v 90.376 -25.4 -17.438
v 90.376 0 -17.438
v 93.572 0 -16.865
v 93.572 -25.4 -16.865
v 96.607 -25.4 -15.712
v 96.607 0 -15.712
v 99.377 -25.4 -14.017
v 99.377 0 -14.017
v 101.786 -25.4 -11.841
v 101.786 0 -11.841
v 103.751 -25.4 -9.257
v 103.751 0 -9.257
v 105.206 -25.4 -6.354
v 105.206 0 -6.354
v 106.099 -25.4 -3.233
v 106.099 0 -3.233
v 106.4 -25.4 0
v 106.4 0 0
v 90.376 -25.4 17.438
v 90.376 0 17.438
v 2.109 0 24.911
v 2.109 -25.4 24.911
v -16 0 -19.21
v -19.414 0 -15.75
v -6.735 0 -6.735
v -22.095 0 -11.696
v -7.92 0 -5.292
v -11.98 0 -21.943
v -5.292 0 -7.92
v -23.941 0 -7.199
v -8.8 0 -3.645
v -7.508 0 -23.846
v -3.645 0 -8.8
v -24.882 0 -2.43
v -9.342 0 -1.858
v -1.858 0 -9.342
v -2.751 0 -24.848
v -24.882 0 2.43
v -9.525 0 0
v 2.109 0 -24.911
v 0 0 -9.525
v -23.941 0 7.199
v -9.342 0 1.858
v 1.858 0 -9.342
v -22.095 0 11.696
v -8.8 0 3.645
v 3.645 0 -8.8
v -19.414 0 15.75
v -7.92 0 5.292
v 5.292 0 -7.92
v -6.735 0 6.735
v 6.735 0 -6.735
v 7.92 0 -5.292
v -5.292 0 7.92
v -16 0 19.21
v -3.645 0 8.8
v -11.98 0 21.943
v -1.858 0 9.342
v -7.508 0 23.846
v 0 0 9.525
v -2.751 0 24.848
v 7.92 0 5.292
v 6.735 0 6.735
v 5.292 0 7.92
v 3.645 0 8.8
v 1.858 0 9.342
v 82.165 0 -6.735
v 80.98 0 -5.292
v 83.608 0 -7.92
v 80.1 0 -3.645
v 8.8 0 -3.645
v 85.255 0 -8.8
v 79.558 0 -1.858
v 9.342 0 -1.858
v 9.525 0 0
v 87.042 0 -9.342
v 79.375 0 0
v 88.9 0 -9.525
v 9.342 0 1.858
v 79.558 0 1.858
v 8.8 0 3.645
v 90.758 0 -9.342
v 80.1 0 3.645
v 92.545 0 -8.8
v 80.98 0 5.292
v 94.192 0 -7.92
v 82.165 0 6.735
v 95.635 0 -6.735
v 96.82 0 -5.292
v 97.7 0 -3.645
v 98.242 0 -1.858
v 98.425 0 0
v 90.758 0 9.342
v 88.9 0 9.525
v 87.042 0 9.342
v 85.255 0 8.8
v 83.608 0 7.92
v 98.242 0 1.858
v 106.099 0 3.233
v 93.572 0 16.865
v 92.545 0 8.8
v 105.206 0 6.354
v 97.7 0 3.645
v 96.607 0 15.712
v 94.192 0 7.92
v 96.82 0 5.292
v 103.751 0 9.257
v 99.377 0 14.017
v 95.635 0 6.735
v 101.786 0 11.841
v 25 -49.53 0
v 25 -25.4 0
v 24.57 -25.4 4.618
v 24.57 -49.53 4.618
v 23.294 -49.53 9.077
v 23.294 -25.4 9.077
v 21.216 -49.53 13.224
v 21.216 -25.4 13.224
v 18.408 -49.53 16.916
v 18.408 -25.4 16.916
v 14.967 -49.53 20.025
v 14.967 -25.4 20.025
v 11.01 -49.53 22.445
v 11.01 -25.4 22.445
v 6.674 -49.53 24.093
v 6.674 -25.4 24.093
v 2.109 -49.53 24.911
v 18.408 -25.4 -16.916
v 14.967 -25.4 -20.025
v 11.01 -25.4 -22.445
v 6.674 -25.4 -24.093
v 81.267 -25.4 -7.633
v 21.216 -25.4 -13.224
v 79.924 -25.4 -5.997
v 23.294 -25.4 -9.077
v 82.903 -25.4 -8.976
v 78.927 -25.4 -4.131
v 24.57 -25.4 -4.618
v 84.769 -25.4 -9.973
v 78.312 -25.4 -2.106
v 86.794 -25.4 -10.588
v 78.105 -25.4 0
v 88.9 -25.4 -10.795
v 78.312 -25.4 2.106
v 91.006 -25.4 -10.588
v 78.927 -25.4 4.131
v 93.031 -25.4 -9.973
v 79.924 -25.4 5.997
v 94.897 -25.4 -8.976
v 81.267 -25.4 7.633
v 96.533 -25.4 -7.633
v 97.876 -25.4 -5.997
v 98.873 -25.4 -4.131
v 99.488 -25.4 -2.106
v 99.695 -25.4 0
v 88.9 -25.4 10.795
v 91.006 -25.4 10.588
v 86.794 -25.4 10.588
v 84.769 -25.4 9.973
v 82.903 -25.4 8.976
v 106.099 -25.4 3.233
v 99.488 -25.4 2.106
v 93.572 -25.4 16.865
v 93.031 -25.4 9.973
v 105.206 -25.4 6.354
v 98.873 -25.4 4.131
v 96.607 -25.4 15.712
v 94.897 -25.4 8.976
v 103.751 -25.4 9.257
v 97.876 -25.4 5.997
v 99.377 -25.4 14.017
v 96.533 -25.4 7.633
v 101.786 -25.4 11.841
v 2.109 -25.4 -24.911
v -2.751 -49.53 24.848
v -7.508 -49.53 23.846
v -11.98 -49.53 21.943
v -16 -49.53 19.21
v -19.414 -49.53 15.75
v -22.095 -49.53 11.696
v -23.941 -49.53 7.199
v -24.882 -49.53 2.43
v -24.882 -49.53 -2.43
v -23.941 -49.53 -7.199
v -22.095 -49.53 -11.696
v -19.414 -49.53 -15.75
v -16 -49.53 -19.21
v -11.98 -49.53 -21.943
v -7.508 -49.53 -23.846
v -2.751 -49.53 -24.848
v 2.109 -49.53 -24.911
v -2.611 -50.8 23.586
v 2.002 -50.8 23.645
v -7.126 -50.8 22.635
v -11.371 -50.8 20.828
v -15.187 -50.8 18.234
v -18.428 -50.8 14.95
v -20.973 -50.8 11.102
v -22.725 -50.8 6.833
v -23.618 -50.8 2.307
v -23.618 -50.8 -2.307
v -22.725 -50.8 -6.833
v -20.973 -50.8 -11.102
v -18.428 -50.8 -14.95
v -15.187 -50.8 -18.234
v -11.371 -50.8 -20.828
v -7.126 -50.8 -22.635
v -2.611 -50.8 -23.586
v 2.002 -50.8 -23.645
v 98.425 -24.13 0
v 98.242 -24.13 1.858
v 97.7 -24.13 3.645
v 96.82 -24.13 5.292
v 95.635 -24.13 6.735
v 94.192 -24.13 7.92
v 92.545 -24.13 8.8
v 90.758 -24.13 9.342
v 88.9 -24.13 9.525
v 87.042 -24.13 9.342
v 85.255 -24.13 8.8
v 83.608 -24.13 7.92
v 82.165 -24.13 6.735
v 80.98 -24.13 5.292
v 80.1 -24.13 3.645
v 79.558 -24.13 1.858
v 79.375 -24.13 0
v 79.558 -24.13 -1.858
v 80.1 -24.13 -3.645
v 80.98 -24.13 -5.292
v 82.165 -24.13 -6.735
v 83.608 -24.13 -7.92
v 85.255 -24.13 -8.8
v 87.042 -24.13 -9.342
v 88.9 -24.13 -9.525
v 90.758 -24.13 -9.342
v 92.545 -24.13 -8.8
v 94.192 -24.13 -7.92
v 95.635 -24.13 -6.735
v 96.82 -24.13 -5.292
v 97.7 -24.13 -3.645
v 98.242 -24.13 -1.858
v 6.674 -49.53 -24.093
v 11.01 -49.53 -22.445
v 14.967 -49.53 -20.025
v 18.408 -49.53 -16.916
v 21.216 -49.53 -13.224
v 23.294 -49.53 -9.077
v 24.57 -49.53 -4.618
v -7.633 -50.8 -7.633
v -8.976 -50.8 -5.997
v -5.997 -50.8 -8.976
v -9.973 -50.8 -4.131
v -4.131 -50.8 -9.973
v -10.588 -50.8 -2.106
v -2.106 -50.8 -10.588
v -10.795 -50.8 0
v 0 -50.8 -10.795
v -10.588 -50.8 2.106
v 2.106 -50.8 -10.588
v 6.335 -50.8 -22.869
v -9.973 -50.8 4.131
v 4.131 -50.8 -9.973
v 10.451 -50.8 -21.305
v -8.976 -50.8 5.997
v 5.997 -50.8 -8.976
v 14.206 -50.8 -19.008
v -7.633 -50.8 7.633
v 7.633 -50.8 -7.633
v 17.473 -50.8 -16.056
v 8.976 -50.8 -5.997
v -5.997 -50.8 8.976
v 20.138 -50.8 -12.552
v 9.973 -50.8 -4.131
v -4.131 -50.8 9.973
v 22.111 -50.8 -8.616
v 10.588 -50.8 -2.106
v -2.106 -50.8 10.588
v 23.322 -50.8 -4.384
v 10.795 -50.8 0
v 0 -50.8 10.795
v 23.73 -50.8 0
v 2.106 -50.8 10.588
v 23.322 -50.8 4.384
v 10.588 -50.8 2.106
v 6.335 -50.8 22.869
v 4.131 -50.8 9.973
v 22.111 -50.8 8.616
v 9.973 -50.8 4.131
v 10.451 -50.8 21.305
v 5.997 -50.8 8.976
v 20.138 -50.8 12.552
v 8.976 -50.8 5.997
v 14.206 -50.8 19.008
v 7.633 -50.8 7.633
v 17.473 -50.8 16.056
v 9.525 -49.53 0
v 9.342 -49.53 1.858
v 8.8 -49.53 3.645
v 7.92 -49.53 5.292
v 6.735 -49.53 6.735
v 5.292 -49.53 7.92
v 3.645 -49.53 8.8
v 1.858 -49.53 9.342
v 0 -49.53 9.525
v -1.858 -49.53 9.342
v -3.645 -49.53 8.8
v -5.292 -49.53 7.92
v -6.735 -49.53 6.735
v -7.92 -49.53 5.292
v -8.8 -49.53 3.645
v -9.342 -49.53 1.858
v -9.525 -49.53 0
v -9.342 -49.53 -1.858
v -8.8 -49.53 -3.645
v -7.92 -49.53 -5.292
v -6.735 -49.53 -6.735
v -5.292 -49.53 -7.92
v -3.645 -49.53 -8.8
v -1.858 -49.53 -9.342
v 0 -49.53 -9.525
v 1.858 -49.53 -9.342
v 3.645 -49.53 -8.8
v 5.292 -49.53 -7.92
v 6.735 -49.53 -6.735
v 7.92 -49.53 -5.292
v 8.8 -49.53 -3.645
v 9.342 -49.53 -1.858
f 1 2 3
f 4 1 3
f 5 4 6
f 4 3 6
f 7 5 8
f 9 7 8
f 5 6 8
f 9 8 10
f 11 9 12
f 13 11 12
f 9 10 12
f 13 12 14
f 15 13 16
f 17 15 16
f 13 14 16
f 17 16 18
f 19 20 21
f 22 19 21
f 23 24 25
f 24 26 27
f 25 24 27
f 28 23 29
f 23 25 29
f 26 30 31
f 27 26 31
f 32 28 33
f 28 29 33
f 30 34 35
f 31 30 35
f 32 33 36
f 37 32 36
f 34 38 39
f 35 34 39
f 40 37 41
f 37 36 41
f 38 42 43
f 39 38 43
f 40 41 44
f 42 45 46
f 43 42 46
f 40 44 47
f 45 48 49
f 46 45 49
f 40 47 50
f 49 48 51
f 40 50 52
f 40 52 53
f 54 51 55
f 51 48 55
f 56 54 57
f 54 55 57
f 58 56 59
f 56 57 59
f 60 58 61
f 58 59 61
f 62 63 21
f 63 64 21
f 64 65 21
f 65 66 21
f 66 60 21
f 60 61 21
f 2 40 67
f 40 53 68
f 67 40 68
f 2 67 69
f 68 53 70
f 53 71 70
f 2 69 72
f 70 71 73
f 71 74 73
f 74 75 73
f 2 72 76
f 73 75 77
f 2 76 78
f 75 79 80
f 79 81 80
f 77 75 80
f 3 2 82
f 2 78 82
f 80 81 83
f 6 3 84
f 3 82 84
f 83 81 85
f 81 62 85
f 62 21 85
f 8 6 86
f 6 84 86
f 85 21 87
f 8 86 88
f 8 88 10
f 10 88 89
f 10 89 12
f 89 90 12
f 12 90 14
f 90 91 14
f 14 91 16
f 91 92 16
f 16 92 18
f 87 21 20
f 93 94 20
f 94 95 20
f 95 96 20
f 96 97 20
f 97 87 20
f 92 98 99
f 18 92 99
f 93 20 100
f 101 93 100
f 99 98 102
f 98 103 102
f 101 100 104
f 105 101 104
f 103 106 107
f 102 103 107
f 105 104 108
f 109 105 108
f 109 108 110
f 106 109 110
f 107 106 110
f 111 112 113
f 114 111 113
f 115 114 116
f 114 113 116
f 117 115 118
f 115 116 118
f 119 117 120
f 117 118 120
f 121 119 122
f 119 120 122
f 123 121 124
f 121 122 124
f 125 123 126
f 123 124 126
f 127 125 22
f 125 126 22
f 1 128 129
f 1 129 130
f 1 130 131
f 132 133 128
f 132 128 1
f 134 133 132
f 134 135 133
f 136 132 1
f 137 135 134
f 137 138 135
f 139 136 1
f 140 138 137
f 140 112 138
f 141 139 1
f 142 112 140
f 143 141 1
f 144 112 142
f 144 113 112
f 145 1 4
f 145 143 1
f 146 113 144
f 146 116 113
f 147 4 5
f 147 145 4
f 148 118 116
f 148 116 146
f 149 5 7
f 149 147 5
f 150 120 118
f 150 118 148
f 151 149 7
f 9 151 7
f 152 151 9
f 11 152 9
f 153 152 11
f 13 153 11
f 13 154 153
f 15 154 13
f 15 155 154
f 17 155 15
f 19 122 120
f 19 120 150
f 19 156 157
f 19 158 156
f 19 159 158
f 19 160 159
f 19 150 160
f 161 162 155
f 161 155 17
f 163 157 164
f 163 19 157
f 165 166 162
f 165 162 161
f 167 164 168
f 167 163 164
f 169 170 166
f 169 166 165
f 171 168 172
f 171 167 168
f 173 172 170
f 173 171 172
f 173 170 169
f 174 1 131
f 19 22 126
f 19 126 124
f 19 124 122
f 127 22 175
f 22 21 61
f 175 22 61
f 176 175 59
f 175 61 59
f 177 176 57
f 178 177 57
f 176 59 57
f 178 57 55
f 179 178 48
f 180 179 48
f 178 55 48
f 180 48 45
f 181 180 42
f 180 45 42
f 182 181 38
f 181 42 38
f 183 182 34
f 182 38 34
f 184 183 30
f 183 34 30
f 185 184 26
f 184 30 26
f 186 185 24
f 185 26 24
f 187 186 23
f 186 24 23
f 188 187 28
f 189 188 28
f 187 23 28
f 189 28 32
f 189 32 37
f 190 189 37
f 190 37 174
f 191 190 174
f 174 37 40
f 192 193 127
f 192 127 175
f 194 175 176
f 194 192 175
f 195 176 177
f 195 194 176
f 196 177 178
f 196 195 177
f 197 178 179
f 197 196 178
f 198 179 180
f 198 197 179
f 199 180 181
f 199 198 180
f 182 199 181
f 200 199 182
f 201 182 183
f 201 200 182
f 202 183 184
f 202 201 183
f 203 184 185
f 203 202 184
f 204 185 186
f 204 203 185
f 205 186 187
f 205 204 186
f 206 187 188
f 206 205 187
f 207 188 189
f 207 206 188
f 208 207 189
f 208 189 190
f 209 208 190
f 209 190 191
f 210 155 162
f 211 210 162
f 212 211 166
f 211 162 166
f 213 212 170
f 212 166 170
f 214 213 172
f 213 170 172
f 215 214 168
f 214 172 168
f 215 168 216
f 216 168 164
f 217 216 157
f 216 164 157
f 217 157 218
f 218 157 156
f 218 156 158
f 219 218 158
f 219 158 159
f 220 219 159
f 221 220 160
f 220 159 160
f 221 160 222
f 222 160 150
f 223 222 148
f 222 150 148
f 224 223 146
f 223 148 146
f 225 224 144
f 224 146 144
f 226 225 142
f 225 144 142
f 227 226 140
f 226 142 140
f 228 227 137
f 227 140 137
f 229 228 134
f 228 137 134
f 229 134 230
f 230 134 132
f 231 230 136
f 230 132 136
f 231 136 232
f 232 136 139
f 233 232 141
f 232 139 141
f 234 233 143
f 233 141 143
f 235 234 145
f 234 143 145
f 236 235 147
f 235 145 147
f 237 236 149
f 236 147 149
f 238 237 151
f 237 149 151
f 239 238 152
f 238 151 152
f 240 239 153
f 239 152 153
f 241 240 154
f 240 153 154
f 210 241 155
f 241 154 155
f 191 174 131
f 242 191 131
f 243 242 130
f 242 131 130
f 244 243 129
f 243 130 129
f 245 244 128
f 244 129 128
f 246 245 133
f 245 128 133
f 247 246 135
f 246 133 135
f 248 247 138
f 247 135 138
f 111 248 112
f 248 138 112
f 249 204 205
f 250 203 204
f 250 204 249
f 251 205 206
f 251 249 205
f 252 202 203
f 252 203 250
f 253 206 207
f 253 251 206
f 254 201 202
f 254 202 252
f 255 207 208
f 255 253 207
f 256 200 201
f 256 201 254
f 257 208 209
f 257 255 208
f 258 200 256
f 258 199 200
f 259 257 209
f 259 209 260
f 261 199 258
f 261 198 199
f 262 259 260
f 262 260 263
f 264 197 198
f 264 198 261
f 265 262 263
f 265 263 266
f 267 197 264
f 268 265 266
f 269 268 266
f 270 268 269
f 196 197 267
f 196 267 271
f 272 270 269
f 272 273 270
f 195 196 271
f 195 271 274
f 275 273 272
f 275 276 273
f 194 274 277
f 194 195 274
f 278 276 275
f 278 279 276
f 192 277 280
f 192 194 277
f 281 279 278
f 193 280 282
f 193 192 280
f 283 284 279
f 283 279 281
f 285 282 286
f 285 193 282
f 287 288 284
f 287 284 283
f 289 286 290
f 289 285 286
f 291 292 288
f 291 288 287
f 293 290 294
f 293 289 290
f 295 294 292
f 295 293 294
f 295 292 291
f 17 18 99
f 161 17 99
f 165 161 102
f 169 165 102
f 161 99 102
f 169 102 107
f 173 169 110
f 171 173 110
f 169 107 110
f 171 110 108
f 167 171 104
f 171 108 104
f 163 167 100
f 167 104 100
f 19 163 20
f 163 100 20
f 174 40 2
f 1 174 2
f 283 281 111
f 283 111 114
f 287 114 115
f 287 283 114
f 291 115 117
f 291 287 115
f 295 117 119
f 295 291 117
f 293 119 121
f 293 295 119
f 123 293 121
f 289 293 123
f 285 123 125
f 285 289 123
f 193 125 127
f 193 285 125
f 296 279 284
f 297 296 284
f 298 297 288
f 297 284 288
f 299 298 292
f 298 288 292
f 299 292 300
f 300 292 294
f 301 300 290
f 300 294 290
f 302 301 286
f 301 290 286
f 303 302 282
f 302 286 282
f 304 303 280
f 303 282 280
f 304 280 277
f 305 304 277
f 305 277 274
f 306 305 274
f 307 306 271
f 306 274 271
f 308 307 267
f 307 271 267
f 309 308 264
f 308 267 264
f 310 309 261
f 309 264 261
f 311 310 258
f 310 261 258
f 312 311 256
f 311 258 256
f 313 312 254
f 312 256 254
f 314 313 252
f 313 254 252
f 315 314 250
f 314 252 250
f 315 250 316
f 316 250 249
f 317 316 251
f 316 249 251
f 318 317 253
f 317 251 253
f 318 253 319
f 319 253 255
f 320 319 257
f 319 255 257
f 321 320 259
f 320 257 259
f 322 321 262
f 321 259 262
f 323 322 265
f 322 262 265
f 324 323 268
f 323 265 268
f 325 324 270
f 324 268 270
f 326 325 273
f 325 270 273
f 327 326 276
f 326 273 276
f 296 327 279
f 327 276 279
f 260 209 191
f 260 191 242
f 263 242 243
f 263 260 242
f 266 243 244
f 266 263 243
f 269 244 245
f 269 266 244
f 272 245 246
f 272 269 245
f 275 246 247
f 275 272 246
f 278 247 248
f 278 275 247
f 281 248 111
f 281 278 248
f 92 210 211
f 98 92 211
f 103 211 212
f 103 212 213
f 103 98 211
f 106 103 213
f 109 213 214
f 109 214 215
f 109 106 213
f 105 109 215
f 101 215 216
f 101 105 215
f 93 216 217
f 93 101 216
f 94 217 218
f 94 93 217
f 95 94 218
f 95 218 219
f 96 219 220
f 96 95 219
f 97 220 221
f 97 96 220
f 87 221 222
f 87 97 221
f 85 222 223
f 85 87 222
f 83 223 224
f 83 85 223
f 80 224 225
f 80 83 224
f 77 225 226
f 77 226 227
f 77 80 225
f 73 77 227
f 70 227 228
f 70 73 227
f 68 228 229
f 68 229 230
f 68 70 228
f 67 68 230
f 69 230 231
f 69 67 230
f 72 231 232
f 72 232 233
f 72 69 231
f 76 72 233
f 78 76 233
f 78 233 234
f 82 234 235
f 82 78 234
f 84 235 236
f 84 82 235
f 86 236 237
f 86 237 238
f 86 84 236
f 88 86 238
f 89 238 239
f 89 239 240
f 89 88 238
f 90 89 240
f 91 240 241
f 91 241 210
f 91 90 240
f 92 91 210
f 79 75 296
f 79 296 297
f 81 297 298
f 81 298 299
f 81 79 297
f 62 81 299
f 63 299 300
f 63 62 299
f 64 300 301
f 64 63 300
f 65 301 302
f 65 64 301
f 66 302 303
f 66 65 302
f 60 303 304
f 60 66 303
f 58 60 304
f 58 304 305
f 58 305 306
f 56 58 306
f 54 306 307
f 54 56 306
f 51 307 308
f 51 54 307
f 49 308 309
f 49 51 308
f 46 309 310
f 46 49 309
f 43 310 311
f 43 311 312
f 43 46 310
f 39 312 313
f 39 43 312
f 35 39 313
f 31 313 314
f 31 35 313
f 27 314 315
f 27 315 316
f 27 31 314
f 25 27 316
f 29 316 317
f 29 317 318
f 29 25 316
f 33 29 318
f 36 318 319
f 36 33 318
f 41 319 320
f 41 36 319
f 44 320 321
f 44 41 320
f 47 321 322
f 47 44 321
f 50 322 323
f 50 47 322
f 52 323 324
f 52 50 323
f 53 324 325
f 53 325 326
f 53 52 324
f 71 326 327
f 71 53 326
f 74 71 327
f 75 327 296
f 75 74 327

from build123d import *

# Parameters (mm, degrees)
F0_R     = 9.525
F1_DEPTH = 25.4
F2_DEPTH = 50.8
F3_SIZE  = 1.27


with BuildPart() as f1:
    # F0 (on Front) → F1 (new body)
    with BuildSketch(Plane.XZ):
        with BuildLine():
            ThreePointArc((90.376378, -17.437612), (101.785779, -11.840891), (106.4, 0))
            ThreePointArc((106.4, 0), (101.785779, 11.840891), (90.376378, 17.437612))
            ThreePointArc((90.376378, 17.437612), (71.4, 0), (90.376378, -17.437612))
        make_face()
        with Locations((88.9, 0)):
            Circle(F0_R, mode=Mode.SUBTRACT)
        with BuildLine():
            ThreePointArc((90.376378, -17.437612), (71.4, 0), (90.376378, 17.437612))
            Line((90.376378, 17.437612), (2.109111, 24.910874))
            ThreePointArc((2.109111, 24.910874), (18.408256, 16.915558), (25, 0))
            ThreePointArc((25, 0), (18.408256, -16.915558), (2.109111, -24.910874))
            Line((2.109111, -24.910874), (90.376378, -17.437612))
        make_face()
        with BuildLine():
            ThreePointArc((25, 0), (18.408256, 16.915558), (2.109111, 24.910874))
            ThreePointArc((2.109111, 24.910874), (-25, 0), (2.109111, -24.910874))
            ThreePointArc((2.109111, -24.910874), (18.408256, -16.915558), (25, 0))
        make_face()
        Circle(F0_R, mode=Mode.SUBTRACT)
    extrude(amount=F1_DEPTH)

    # F0 (on Front) → F2 (join)
    with BuildSketch(Plane.XZ):
        with BuildLine():
            ThreePointArc((25, 0), (18.408256, 16.915558), (2.109111, 24.910874))
            ThreePointArc((2.109111, 24.910874), (-25, 0), (2.109111, -24.910874))
            ThreePointArc((2.109111, -24.910874), (18.408256, -16.915558), (25, 0))
        make_face()
        Circle(F0_R, mode=Mode.SUBTRACT)
    extrude(amount=F2_DEPTH)

    # F3
    f3_edges = [f1.edges().sort_by_distance(p)[0] for p in [
        (-9.525, -50.8, 0),
        (-2.109111, -50.8, 24.910874),
        (79.375, -25.4, 0),
    ]]
    chamfer(f3_edges, length=F3_SIZE)


solid = f1.part
